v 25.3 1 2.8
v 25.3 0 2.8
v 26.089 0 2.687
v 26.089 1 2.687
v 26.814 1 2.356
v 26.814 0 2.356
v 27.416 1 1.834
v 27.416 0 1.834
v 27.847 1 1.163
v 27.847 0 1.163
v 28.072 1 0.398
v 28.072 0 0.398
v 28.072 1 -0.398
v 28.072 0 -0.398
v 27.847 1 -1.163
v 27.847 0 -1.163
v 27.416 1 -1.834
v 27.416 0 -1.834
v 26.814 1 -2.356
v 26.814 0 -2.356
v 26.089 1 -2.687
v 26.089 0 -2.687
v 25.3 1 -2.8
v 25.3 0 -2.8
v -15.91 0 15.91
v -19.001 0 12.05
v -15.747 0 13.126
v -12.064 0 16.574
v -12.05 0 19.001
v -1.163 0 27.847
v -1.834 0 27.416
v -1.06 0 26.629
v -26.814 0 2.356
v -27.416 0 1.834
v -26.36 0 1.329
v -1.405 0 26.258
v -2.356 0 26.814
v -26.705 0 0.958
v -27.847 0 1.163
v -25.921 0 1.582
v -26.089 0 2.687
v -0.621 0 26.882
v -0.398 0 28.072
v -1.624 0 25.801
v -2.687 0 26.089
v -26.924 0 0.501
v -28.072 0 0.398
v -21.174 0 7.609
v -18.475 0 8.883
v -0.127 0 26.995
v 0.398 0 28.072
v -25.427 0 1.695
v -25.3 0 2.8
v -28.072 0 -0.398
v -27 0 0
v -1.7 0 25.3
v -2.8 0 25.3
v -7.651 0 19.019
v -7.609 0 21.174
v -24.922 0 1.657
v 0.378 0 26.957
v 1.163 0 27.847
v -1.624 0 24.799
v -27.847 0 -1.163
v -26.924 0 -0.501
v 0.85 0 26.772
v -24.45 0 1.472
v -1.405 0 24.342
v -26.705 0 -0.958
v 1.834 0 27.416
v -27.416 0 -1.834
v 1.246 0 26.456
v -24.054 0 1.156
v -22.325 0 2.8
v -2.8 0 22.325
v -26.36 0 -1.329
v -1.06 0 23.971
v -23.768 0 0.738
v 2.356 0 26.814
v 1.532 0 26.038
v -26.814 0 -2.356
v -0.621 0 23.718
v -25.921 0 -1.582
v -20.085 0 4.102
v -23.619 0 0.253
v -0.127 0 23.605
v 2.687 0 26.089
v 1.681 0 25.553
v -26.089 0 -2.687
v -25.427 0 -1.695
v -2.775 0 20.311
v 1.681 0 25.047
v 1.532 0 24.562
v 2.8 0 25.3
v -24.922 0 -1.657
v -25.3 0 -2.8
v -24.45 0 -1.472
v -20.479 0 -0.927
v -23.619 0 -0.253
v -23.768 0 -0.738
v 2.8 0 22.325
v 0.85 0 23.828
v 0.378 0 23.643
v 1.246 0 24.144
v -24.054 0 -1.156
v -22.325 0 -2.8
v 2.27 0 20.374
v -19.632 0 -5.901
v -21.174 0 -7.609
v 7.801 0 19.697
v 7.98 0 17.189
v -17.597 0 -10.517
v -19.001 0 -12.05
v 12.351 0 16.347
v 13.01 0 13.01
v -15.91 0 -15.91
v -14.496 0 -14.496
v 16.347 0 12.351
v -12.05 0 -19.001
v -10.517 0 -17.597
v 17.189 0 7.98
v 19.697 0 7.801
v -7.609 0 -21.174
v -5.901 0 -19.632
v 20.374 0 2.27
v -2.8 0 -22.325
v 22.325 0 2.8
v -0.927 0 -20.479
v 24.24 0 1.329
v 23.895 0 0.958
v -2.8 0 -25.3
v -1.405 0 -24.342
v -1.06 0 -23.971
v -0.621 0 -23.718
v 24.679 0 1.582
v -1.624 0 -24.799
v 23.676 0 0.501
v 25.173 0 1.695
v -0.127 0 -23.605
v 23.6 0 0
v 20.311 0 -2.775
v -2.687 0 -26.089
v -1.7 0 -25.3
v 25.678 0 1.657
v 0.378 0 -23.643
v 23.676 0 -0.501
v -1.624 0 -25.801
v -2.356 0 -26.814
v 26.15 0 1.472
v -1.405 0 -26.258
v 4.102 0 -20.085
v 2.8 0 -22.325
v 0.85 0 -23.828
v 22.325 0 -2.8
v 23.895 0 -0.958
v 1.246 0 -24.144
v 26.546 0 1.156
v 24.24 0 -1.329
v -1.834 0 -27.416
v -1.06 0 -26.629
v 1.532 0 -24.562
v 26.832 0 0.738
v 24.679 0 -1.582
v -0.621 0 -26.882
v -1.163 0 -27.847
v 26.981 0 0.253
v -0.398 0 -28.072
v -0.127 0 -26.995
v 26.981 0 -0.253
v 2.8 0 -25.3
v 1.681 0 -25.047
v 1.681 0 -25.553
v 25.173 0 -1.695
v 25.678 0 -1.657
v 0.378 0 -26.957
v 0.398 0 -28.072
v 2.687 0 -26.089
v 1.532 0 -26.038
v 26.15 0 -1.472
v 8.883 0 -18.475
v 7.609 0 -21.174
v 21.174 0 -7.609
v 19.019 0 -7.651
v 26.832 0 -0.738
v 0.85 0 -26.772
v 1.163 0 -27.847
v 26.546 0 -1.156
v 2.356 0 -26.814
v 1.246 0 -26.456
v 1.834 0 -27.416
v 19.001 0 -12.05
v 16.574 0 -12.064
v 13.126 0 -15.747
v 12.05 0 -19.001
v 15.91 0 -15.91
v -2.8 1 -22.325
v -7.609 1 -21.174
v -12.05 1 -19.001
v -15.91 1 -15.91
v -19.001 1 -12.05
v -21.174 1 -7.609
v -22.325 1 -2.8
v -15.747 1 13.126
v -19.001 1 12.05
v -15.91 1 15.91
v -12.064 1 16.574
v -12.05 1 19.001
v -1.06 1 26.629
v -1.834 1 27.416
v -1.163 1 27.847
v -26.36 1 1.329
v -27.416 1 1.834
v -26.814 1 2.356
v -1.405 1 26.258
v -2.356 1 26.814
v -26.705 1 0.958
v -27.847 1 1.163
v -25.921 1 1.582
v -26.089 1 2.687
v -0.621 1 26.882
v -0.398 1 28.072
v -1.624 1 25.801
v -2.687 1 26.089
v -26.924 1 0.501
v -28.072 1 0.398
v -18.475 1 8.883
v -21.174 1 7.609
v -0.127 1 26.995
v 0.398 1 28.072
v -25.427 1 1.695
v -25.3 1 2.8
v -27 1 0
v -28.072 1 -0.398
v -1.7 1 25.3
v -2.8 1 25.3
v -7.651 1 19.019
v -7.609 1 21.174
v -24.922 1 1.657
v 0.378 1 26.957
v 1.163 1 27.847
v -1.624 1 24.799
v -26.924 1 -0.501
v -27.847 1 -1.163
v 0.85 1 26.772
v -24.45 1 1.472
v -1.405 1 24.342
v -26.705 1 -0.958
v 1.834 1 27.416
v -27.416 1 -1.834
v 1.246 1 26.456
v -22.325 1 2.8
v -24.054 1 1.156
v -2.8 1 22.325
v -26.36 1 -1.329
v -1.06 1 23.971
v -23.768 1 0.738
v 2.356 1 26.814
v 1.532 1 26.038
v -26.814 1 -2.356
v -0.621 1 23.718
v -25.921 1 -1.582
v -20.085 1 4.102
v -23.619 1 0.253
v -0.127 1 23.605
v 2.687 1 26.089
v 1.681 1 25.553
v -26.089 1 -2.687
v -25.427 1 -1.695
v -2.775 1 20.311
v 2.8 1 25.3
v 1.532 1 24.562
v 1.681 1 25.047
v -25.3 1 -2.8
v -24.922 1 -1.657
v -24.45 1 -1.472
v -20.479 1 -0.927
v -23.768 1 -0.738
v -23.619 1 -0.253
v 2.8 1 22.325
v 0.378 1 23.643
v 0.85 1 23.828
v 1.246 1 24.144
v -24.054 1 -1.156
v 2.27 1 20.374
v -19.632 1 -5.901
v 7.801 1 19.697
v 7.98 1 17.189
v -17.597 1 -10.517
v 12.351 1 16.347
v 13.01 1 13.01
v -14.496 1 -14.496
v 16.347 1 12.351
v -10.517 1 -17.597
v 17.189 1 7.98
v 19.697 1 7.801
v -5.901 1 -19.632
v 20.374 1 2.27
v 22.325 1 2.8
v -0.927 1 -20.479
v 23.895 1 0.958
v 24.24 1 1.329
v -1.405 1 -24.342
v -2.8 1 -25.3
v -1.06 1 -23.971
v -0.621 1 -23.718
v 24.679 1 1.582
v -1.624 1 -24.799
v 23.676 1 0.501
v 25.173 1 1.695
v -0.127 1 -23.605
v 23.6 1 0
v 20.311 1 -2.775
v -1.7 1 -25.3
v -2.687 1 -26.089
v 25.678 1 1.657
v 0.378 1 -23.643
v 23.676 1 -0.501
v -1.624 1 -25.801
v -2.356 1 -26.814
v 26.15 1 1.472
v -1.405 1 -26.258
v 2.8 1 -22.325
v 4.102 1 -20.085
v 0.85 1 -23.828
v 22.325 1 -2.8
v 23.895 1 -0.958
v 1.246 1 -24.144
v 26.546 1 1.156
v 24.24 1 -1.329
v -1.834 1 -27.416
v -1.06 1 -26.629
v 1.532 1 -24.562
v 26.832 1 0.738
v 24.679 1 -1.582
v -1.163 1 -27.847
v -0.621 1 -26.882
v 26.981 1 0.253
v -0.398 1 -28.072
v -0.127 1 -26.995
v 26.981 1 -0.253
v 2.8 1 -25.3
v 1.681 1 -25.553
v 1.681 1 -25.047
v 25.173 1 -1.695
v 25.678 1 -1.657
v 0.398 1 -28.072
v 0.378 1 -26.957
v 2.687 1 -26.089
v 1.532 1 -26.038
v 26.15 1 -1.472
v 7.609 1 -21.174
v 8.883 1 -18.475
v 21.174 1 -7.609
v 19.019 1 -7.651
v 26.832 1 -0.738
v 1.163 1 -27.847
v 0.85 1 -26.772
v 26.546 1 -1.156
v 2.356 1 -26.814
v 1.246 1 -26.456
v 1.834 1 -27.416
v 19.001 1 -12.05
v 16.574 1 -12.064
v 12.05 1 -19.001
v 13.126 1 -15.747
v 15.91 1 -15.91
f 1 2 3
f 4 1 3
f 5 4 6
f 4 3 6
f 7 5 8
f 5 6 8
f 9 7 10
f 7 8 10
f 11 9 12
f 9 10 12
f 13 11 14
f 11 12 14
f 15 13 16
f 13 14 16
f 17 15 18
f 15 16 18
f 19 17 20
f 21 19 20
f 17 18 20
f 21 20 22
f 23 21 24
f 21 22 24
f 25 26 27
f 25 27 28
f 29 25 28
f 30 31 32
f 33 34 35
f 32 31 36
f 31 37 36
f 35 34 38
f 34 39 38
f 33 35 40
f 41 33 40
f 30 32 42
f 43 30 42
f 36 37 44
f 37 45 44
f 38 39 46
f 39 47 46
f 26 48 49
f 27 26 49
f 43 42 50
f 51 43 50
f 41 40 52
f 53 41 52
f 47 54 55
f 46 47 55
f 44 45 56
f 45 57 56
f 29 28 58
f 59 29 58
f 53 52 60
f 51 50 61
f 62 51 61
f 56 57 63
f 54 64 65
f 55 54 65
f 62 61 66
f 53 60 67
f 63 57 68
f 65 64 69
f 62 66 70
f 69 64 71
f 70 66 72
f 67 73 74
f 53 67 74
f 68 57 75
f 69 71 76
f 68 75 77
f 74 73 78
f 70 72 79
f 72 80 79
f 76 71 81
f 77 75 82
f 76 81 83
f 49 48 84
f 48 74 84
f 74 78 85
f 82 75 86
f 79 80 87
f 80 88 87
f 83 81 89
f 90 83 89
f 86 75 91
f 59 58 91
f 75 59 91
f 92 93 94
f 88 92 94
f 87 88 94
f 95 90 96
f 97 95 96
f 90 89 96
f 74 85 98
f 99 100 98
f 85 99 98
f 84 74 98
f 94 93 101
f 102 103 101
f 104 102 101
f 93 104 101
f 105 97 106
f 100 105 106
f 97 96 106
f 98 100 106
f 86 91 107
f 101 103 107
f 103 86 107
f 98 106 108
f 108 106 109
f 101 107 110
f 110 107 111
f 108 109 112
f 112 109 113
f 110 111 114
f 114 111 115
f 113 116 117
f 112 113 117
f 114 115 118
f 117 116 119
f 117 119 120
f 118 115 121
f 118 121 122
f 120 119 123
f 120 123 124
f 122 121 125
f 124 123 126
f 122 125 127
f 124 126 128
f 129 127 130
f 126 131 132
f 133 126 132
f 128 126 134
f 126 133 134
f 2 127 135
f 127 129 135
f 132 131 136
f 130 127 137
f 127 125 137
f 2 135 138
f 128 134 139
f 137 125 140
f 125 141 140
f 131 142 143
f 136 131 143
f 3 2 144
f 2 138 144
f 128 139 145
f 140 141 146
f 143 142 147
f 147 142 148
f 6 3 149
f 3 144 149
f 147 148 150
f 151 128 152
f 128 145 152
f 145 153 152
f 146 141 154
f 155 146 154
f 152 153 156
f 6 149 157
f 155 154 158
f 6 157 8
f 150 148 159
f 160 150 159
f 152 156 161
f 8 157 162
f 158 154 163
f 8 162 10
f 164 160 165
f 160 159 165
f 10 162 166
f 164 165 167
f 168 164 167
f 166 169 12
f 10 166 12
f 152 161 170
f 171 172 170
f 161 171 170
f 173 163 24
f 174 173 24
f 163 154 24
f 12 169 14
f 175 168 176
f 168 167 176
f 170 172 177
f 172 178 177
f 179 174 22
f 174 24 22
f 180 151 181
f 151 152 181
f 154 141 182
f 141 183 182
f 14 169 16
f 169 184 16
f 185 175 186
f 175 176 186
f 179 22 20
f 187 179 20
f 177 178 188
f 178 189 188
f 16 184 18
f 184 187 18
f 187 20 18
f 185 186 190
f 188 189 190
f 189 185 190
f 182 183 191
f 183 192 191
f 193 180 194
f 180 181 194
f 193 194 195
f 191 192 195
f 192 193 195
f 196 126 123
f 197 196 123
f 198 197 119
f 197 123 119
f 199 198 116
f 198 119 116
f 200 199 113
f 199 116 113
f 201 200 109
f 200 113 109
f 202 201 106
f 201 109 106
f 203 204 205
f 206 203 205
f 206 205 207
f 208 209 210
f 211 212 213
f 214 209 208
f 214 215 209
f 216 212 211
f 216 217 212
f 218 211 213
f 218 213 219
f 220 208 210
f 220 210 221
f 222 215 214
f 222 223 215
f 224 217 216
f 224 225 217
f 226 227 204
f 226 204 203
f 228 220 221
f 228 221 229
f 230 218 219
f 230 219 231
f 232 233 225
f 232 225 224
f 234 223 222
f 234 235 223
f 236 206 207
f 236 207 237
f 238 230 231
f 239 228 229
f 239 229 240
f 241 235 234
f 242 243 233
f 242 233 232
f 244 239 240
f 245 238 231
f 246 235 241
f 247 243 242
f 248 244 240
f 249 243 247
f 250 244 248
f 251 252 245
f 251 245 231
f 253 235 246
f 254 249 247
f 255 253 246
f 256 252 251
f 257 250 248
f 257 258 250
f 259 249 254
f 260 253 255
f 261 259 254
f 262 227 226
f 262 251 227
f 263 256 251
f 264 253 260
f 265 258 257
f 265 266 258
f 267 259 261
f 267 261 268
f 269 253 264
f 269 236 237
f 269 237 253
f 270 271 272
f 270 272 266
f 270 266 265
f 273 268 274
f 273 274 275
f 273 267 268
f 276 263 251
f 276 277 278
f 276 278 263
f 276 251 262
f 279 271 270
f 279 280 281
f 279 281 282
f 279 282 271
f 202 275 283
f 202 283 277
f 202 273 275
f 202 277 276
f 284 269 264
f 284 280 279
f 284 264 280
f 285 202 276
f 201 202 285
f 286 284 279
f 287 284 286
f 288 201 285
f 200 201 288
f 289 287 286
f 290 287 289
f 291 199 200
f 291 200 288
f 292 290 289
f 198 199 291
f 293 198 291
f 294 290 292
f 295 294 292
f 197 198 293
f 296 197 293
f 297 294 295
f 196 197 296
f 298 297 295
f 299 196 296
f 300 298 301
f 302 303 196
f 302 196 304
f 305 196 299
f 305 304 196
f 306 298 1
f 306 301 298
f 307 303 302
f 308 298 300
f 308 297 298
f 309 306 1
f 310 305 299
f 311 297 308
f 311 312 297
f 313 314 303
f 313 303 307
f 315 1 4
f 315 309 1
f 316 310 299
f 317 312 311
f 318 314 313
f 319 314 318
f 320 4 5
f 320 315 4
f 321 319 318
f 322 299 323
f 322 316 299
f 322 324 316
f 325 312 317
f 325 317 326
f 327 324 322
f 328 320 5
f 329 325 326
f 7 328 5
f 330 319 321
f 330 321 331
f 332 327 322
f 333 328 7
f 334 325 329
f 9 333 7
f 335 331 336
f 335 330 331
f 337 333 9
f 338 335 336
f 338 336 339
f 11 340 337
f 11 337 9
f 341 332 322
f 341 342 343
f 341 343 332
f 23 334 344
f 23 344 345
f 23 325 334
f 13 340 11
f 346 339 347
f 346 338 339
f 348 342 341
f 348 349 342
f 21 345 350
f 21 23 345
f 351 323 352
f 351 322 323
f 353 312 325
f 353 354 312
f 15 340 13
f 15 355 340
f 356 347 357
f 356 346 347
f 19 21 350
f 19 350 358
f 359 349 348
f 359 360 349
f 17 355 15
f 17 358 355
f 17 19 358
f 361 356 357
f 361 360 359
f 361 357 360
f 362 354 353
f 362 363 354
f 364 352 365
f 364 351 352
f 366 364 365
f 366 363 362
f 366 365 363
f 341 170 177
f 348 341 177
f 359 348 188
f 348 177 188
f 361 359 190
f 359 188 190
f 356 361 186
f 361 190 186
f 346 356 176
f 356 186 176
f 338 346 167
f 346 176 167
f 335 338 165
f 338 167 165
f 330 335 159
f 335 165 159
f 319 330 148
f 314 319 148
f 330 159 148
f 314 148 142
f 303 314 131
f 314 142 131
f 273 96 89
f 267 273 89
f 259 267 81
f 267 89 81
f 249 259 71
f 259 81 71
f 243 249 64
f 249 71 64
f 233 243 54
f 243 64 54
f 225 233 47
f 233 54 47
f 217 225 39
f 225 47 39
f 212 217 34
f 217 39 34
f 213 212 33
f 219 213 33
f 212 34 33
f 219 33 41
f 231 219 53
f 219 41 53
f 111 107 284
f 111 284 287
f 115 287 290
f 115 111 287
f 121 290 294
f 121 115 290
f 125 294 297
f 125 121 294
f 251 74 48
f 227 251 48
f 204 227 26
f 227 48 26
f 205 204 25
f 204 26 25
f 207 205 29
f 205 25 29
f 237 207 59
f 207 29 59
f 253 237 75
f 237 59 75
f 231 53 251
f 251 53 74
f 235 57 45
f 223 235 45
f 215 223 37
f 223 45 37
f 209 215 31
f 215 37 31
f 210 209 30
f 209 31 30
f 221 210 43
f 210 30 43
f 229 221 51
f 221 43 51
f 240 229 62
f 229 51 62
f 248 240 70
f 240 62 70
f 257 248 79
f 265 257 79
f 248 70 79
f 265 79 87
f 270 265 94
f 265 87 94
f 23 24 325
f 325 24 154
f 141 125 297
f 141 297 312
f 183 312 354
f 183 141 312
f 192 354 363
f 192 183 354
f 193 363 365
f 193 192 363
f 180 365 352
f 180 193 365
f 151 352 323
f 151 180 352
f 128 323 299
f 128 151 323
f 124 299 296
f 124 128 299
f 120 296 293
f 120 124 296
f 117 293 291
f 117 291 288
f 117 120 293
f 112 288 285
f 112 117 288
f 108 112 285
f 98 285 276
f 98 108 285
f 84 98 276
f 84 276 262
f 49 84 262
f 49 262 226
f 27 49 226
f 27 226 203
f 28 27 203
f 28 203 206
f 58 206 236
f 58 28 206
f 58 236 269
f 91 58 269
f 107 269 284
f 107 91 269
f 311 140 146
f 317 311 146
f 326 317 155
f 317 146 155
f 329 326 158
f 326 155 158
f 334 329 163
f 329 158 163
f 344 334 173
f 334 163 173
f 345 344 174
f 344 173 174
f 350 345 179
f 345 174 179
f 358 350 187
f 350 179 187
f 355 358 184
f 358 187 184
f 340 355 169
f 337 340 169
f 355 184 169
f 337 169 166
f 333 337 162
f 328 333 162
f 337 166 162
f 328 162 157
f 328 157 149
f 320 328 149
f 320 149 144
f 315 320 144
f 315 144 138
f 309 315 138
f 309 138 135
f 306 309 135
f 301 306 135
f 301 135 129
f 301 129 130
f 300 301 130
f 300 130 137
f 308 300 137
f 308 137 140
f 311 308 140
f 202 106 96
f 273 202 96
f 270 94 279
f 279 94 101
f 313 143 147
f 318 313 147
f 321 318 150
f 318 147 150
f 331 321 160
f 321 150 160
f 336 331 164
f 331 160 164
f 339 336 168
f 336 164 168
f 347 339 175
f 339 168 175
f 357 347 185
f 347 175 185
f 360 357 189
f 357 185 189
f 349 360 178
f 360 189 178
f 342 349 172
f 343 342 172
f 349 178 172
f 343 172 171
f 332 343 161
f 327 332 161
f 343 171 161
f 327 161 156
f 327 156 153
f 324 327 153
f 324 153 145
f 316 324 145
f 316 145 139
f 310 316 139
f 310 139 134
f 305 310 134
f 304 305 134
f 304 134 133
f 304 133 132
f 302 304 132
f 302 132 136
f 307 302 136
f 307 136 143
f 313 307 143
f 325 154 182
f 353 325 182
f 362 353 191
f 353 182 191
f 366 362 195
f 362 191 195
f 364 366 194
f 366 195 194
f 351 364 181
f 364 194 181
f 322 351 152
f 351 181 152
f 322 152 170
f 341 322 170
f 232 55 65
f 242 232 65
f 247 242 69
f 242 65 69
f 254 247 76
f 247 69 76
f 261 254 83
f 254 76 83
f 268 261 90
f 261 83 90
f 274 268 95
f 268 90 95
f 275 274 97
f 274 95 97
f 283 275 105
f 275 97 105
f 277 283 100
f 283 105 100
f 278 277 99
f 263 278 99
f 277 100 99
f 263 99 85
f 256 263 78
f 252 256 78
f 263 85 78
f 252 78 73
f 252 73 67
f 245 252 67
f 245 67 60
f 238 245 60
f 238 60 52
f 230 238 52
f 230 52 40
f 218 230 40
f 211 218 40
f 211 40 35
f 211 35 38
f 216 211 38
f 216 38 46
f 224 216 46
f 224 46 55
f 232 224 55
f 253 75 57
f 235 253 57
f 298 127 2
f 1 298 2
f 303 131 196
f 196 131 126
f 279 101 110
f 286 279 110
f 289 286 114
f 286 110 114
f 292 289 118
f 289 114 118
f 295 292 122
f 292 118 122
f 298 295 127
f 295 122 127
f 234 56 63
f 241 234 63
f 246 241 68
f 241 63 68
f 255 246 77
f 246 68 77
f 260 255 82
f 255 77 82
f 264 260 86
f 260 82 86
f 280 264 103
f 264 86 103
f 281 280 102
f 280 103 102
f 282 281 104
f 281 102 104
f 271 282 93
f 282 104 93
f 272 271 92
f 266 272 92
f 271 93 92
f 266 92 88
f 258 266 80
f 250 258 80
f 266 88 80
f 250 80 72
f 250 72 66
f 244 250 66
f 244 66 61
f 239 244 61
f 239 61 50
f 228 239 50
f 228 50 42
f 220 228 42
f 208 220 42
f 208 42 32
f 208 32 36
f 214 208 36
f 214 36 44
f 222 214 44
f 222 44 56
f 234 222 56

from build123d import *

# Parameters (mm, degrees)
EXTRUDE_1_DEPTH   = 1
HOLE_WIZARD_M31_D = 3.4


with BuildPart() as part:
    # Эскиз1 → Бобышка-Вытянуть1 (new body)
    with BuildSketch(Plane(origin=(0, 0, 0), x_dir=(1, 0, 0), z_dir=(0, 1, 0))):
        with BuildLine():
            Line((22.325097984, -2.8), (25.3, -2.8))
            ThreePointArc((25.3, -2.8), (28.1, 0), (25.3, 2.8))
            Line((25.3, 2.8), (22.325097984, 2.8))
            ThreePointArc((22.325097984, 2.8), (15.909902577, 15.909902577), (2.8, 22.325097984))
            Line((2.8, 22.325097984), (2.8, 25.3))
            ThreePointArc((2.8, 25.3), (0, 28.1), (-2.8, 25.3))
            Line((-2.8, 25.3), (-2.8, 22.325097984))
            ThreePointArc((-2.8, 22.325097984), (-15.909902577, 15.909902577), (-22.325097984, 2.8))
            Line((-22.325097984, 2.8), (-25.3, 2.8))
            ThreePointArc((-25.3, 2.8), (-28.1, 0), (-25.3, -2.8))
            Line((-25.3, -2.8), (-22.325097984, -2.8))
            ThreePointArc((-22.325097984, -2.8), (-15.909902577, -15.909902577), (-2.8, -22.325097984))
            Line((-2.8, -22.325097984), (-2.8, -25.3))
            ThreePointArc((-2.8, -25.3), (0, -28.1), (2.8, -25.3))
            Line((2.8, -25.3), (2.8, -22.325097984))
            ThreePointArc((2.8, -22.325097984), (14.4243682, -14.4243682), (22.325097984, -2.8))
        make_face()
        with BuildLine():
            ThreePointArc((20.373939602, -2.269930633), (-14.495689014, 14.495689014), (2.269930633, -20.373939602))
            ThreePointArc((2.269930633, -20.373939602), (13.010154638, -13.010154638), (20.373939602, -2.269930633))
        make_face(mode=Mode.SUBTRACT)
    extrude(amount=EXTRUDE_1_DEPTH)

    # Отверстие с зазором M31 (through all)
    with Locations(Plane(origin=(0, 1, 0), x_dir=(1, 0, 0), z_dir=(0, 1, 0))):
        with Locations((-25.3, 0), (0, 25.3), (25.3, 0), (0, -25.3)):
            Hole(HOLE_WIZARD_M31_D / 2)


solid = part.part
